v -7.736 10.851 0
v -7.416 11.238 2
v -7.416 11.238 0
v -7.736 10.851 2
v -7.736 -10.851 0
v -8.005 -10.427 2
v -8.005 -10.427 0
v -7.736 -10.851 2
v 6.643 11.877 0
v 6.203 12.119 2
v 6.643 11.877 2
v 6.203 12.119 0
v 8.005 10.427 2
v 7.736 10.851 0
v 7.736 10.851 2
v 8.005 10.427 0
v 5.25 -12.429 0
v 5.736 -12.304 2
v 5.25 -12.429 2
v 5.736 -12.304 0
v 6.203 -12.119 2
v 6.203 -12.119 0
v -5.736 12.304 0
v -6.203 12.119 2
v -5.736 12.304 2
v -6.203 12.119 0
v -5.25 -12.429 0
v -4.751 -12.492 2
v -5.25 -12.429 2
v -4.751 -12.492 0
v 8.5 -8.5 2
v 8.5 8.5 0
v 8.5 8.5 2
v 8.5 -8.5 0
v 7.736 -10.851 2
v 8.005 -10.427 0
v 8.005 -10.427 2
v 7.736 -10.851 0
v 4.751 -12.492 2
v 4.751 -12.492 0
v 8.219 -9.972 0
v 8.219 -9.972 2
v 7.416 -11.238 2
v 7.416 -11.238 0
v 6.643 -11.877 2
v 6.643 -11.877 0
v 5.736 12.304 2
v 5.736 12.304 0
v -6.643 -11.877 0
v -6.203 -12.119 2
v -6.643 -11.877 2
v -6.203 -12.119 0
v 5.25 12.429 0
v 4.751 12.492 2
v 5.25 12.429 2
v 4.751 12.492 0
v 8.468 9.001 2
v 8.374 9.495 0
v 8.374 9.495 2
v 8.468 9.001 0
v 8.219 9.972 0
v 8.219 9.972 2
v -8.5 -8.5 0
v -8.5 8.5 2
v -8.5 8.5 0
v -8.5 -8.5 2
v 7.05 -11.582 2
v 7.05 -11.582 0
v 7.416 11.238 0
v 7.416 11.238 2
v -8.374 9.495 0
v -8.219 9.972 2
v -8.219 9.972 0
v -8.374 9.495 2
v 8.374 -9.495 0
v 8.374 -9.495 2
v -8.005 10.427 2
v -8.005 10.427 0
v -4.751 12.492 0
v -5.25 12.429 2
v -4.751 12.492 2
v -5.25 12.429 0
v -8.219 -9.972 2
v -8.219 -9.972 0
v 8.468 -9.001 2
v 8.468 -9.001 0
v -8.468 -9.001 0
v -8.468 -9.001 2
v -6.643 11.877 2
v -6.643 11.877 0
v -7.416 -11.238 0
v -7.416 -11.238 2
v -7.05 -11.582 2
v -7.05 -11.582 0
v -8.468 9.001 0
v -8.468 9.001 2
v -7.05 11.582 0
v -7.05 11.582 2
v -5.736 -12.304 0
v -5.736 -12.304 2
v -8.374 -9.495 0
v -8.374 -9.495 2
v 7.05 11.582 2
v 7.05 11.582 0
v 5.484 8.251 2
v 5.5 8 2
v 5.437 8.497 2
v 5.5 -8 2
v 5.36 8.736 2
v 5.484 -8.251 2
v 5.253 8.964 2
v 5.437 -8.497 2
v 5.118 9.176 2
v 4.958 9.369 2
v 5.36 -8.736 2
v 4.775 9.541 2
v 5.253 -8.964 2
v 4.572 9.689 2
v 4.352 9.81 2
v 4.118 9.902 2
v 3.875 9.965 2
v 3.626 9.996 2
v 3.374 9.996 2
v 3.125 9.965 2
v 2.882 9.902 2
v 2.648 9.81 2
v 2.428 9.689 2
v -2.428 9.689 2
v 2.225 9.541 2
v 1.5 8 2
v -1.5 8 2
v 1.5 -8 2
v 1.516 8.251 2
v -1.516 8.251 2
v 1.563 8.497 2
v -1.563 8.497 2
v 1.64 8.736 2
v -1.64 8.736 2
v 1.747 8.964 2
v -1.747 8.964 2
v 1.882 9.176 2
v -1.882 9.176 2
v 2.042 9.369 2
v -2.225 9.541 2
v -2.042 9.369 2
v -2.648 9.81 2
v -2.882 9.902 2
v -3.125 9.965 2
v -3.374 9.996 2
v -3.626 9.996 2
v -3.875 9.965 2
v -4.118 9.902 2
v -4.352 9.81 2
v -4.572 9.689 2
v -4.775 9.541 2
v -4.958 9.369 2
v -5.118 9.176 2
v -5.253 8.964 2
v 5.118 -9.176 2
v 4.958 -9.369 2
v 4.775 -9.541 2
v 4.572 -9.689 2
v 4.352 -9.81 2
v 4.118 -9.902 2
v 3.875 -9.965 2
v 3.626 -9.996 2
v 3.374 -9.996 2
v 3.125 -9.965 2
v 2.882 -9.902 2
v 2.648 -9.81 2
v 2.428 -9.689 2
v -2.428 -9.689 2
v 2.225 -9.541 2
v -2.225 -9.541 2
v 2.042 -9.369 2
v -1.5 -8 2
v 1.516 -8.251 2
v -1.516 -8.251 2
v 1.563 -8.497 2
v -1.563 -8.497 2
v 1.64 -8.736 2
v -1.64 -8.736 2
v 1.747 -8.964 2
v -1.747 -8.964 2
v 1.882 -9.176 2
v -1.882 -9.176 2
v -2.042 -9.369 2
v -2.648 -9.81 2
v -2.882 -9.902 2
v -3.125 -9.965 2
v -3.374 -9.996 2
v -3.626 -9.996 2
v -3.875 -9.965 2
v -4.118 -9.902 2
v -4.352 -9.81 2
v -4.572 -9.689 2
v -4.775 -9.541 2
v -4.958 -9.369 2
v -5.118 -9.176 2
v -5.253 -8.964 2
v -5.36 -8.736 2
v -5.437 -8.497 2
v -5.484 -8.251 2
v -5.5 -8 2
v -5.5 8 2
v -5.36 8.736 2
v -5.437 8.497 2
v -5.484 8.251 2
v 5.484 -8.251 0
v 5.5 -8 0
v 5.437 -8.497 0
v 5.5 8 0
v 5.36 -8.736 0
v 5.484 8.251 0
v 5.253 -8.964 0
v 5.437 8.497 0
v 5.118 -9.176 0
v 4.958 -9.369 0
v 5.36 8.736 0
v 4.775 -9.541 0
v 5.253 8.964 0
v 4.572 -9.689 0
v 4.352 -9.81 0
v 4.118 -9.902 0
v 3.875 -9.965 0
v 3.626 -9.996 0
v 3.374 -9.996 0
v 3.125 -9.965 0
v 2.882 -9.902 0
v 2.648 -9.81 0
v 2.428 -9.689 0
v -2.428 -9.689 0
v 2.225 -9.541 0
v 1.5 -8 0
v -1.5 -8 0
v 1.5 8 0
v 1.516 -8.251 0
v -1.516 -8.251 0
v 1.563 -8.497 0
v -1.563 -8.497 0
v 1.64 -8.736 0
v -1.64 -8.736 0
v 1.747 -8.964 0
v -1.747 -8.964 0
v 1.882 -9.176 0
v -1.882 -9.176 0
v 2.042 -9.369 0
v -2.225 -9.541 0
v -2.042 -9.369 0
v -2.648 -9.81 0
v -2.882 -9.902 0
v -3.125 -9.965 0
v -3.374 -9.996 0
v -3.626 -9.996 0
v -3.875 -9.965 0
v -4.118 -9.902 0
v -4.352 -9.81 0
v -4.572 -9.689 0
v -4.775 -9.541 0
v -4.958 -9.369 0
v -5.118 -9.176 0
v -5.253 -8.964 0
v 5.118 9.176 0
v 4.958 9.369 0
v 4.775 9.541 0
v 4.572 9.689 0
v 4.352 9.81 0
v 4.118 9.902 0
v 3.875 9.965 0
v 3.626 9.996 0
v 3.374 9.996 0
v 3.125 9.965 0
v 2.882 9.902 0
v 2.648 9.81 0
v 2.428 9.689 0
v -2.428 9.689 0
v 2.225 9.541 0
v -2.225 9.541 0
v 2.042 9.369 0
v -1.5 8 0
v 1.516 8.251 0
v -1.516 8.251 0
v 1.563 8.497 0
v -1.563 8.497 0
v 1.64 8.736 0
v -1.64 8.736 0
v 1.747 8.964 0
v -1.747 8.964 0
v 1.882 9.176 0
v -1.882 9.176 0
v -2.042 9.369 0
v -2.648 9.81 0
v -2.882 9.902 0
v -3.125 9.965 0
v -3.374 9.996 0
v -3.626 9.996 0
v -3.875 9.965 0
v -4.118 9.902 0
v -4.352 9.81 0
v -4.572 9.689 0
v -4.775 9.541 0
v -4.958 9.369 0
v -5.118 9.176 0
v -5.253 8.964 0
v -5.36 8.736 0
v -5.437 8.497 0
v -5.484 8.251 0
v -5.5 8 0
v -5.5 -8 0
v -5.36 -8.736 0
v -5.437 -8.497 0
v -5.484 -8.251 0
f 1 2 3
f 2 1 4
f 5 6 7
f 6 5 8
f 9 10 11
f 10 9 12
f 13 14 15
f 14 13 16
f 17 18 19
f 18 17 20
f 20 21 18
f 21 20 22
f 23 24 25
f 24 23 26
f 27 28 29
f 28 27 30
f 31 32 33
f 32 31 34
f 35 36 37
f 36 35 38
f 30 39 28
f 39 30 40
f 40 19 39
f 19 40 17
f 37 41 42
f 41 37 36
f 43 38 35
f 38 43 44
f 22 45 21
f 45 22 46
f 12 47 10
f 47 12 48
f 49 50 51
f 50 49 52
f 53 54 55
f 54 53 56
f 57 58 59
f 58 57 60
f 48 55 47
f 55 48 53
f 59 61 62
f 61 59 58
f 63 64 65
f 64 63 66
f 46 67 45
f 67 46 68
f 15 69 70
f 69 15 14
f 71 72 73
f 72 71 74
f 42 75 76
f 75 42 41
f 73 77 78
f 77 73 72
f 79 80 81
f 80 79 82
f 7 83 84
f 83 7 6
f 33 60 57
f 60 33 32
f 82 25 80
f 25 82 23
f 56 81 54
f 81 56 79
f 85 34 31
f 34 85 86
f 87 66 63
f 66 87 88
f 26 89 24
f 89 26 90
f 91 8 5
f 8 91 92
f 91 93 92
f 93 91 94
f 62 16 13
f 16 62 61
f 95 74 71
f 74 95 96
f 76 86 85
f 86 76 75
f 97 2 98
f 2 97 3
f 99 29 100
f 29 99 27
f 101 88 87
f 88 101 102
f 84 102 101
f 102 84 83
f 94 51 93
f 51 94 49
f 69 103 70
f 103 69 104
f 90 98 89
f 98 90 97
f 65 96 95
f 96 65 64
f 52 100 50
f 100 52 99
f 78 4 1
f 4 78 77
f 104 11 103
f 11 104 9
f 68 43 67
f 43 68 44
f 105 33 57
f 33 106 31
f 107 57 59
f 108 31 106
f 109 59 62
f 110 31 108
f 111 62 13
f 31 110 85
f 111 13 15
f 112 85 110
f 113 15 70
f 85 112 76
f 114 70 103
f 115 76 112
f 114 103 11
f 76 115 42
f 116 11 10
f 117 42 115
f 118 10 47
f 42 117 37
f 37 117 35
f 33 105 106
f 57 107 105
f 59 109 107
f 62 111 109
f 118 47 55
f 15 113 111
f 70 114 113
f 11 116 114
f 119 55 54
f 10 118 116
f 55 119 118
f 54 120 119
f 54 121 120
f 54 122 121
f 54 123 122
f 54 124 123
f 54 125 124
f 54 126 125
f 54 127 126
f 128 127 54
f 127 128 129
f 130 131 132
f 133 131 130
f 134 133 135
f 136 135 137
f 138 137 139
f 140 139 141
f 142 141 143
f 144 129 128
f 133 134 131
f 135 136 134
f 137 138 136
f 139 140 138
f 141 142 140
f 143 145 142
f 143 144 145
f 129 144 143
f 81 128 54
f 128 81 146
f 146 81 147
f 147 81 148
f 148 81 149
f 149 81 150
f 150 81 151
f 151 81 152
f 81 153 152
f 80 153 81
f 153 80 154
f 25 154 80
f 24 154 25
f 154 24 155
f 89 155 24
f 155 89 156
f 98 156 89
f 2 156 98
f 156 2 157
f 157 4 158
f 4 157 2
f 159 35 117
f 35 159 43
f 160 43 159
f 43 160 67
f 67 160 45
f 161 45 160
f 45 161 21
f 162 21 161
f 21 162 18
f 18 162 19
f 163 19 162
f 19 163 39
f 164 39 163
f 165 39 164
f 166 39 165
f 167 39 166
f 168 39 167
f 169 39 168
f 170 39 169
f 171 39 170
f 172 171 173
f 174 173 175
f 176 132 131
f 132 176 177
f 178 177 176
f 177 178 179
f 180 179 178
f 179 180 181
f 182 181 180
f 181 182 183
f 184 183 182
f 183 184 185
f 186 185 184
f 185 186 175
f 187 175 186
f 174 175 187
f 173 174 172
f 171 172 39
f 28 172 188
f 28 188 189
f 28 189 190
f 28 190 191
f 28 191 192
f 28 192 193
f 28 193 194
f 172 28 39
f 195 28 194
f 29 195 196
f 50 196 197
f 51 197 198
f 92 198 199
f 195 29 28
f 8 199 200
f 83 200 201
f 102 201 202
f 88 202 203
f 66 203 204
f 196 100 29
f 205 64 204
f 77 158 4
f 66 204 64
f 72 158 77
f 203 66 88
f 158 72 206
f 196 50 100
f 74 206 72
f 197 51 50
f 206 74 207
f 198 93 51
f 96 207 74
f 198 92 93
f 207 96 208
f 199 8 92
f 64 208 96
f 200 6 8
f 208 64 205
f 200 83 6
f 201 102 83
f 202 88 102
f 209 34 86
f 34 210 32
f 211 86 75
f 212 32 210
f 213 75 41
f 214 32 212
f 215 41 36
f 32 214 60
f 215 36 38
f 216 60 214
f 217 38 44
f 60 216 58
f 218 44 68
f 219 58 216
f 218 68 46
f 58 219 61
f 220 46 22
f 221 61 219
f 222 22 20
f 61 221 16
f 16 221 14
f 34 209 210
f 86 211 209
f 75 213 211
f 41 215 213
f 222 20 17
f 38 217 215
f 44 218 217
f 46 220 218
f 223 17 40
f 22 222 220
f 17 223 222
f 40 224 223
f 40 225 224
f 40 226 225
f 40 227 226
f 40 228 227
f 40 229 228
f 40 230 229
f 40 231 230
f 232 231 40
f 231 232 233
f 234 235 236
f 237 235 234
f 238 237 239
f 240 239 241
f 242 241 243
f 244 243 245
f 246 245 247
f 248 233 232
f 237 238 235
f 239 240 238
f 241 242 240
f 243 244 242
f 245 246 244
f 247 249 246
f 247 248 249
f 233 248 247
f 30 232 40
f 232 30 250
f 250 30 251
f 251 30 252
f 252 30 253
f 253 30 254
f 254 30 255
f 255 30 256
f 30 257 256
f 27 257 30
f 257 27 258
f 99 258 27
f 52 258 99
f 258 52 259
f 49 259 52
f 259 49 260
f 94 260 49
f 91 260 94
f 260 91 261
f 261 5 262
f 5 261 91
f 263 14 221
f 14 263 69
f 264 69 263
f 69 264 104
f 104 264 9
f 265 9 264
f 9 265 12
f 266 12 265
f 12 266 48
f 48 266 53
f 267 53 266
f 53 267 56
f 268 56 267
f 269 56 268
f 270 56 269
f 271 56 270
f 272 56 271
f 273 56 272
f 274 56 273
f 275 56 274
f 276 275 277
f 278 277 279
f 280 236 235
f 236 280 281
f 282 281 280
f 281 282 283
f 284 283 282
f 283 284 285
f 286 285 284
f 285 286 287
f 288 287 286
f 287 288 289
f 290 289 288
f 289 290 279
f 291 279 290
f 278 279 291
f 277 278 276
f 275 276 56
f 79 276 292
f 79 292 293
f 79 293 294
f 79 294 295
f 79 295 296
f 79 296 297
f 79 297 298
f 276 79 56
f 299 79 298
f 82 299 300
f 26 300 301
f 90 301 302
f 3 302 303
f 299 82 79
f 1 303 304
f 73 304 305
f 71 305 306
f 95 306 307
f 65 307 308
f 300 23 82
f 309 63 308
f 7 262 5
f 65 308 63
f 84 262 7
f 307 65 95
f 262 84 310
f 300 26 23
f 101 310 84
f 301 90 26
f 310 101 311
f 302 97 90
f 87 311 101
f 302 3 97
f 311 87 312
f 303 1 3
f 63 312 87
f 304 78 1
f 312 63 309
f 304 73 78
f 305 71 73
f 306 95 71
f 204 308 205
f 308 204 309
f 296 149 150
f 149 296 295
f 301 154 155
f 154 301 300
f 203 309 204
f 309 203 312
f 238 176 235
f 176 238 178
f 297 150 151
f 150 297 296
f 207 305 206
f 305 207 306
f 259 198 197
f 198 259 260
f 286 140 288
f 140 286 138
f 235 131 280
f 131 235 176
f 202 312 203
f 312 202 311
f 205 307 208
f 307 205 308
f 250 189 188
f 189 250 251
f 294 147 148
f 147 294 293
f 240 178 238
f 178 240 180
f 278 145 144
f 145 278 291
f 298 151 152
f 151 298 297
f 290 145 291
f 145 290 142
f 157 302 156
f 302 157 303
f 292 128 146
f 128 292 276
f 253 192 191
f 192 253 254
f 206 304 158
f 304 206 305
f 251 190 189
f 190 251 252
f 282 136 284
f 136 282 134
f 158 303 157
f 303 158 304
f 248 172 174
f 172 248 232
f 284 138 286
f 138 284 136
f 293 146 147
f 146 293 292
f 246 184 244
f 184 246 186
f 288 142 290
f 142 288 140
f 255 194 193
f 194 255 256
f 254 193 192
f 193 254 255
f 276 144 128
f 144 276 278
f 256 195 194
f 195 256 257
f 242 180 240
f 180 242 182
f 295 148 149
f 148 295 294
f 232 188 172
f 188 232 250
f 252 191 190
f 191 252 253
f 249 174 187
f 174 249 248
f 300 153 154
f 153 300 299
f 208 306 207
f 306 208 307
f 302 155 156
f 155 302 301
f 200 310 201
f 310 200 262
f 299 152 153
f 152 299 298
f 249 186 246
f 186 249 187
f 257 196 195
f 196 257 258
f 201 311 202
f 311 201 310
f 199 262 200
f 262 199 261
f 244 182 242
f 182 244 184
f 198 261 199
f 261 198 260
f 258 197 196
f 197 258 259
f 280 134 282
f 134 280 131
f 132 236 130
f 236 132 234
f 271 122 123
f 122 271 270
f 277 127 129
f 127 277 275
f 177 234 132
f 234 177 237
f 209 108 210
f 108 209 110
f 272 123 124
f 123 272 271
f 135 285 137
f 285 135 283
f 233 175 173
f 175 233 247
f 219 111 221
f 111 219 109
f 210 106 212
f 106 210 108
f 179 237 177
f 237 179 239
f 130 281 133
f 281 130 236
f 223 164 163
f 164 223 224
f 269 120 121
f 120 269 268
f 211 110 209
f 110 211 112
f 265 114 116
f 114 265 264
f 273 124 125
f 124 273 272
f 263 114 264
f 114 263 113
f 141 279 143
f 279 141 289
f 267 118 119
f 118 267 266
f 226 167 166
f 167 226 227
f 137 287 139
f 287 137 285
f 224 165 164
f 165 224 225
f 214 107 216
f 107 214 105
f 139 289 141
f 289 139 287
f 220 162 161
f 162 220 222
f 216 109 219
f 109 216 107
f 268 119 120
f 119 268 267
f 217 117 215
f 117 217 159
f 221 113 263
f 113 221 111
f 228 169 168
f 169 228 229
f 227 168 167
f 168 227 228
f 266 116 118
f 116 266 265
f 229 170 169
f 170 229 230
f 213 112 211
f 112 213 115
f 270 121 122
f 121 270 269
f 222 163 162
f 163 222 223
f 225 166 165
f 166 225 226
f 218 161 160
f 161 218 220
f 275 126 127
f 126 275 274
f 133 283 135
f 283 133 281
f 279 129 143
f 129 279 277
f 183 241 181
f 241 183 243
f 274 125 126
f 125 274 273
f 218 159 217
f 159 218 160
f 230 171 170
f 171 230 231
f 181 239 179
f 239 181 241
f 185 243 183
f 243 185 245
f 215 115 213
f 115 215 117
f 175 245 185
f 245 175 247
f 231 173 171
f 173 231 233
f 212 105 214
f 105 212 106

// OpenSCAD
SLOT_WIDTH = 4;
SLOT_LENGTH = 20;
SLOT_SPACING = 7;

THICKNESS = 2;
LENGTH = 25;
WIDTH = 17;
CORNER_DIA = 8;

$fn = 50;

module rounded_rect(width, length, height, corner_dia) {
  hull() {
    for(i = [-1, 1]) {
      for(j = [-1, 1]) {
        translate([i * (width - corner_dia)/2, j * (length - corner_dia)/2, 0])
        cylinder(d = corner_dia, h = height);
      }
    }
  }
}

difference() {
  rounded_rect(WIDTH, LENGTH, THICKNESS, CORNER_DIA);
  #translate([-SLOT_SPACING/2, 0, 0,])
  rounded_rect(SLOT_WIDTH, SLOT_LENGTH, THICKNESS, SLOT_WIDTH);
  #translate([SLOT_SPACING/2, 0, 0])
  rounded_rect(SLOT_WIDTH, SLOT_LENGTH, THICKNESS, SLOT_WIDTH);
}
